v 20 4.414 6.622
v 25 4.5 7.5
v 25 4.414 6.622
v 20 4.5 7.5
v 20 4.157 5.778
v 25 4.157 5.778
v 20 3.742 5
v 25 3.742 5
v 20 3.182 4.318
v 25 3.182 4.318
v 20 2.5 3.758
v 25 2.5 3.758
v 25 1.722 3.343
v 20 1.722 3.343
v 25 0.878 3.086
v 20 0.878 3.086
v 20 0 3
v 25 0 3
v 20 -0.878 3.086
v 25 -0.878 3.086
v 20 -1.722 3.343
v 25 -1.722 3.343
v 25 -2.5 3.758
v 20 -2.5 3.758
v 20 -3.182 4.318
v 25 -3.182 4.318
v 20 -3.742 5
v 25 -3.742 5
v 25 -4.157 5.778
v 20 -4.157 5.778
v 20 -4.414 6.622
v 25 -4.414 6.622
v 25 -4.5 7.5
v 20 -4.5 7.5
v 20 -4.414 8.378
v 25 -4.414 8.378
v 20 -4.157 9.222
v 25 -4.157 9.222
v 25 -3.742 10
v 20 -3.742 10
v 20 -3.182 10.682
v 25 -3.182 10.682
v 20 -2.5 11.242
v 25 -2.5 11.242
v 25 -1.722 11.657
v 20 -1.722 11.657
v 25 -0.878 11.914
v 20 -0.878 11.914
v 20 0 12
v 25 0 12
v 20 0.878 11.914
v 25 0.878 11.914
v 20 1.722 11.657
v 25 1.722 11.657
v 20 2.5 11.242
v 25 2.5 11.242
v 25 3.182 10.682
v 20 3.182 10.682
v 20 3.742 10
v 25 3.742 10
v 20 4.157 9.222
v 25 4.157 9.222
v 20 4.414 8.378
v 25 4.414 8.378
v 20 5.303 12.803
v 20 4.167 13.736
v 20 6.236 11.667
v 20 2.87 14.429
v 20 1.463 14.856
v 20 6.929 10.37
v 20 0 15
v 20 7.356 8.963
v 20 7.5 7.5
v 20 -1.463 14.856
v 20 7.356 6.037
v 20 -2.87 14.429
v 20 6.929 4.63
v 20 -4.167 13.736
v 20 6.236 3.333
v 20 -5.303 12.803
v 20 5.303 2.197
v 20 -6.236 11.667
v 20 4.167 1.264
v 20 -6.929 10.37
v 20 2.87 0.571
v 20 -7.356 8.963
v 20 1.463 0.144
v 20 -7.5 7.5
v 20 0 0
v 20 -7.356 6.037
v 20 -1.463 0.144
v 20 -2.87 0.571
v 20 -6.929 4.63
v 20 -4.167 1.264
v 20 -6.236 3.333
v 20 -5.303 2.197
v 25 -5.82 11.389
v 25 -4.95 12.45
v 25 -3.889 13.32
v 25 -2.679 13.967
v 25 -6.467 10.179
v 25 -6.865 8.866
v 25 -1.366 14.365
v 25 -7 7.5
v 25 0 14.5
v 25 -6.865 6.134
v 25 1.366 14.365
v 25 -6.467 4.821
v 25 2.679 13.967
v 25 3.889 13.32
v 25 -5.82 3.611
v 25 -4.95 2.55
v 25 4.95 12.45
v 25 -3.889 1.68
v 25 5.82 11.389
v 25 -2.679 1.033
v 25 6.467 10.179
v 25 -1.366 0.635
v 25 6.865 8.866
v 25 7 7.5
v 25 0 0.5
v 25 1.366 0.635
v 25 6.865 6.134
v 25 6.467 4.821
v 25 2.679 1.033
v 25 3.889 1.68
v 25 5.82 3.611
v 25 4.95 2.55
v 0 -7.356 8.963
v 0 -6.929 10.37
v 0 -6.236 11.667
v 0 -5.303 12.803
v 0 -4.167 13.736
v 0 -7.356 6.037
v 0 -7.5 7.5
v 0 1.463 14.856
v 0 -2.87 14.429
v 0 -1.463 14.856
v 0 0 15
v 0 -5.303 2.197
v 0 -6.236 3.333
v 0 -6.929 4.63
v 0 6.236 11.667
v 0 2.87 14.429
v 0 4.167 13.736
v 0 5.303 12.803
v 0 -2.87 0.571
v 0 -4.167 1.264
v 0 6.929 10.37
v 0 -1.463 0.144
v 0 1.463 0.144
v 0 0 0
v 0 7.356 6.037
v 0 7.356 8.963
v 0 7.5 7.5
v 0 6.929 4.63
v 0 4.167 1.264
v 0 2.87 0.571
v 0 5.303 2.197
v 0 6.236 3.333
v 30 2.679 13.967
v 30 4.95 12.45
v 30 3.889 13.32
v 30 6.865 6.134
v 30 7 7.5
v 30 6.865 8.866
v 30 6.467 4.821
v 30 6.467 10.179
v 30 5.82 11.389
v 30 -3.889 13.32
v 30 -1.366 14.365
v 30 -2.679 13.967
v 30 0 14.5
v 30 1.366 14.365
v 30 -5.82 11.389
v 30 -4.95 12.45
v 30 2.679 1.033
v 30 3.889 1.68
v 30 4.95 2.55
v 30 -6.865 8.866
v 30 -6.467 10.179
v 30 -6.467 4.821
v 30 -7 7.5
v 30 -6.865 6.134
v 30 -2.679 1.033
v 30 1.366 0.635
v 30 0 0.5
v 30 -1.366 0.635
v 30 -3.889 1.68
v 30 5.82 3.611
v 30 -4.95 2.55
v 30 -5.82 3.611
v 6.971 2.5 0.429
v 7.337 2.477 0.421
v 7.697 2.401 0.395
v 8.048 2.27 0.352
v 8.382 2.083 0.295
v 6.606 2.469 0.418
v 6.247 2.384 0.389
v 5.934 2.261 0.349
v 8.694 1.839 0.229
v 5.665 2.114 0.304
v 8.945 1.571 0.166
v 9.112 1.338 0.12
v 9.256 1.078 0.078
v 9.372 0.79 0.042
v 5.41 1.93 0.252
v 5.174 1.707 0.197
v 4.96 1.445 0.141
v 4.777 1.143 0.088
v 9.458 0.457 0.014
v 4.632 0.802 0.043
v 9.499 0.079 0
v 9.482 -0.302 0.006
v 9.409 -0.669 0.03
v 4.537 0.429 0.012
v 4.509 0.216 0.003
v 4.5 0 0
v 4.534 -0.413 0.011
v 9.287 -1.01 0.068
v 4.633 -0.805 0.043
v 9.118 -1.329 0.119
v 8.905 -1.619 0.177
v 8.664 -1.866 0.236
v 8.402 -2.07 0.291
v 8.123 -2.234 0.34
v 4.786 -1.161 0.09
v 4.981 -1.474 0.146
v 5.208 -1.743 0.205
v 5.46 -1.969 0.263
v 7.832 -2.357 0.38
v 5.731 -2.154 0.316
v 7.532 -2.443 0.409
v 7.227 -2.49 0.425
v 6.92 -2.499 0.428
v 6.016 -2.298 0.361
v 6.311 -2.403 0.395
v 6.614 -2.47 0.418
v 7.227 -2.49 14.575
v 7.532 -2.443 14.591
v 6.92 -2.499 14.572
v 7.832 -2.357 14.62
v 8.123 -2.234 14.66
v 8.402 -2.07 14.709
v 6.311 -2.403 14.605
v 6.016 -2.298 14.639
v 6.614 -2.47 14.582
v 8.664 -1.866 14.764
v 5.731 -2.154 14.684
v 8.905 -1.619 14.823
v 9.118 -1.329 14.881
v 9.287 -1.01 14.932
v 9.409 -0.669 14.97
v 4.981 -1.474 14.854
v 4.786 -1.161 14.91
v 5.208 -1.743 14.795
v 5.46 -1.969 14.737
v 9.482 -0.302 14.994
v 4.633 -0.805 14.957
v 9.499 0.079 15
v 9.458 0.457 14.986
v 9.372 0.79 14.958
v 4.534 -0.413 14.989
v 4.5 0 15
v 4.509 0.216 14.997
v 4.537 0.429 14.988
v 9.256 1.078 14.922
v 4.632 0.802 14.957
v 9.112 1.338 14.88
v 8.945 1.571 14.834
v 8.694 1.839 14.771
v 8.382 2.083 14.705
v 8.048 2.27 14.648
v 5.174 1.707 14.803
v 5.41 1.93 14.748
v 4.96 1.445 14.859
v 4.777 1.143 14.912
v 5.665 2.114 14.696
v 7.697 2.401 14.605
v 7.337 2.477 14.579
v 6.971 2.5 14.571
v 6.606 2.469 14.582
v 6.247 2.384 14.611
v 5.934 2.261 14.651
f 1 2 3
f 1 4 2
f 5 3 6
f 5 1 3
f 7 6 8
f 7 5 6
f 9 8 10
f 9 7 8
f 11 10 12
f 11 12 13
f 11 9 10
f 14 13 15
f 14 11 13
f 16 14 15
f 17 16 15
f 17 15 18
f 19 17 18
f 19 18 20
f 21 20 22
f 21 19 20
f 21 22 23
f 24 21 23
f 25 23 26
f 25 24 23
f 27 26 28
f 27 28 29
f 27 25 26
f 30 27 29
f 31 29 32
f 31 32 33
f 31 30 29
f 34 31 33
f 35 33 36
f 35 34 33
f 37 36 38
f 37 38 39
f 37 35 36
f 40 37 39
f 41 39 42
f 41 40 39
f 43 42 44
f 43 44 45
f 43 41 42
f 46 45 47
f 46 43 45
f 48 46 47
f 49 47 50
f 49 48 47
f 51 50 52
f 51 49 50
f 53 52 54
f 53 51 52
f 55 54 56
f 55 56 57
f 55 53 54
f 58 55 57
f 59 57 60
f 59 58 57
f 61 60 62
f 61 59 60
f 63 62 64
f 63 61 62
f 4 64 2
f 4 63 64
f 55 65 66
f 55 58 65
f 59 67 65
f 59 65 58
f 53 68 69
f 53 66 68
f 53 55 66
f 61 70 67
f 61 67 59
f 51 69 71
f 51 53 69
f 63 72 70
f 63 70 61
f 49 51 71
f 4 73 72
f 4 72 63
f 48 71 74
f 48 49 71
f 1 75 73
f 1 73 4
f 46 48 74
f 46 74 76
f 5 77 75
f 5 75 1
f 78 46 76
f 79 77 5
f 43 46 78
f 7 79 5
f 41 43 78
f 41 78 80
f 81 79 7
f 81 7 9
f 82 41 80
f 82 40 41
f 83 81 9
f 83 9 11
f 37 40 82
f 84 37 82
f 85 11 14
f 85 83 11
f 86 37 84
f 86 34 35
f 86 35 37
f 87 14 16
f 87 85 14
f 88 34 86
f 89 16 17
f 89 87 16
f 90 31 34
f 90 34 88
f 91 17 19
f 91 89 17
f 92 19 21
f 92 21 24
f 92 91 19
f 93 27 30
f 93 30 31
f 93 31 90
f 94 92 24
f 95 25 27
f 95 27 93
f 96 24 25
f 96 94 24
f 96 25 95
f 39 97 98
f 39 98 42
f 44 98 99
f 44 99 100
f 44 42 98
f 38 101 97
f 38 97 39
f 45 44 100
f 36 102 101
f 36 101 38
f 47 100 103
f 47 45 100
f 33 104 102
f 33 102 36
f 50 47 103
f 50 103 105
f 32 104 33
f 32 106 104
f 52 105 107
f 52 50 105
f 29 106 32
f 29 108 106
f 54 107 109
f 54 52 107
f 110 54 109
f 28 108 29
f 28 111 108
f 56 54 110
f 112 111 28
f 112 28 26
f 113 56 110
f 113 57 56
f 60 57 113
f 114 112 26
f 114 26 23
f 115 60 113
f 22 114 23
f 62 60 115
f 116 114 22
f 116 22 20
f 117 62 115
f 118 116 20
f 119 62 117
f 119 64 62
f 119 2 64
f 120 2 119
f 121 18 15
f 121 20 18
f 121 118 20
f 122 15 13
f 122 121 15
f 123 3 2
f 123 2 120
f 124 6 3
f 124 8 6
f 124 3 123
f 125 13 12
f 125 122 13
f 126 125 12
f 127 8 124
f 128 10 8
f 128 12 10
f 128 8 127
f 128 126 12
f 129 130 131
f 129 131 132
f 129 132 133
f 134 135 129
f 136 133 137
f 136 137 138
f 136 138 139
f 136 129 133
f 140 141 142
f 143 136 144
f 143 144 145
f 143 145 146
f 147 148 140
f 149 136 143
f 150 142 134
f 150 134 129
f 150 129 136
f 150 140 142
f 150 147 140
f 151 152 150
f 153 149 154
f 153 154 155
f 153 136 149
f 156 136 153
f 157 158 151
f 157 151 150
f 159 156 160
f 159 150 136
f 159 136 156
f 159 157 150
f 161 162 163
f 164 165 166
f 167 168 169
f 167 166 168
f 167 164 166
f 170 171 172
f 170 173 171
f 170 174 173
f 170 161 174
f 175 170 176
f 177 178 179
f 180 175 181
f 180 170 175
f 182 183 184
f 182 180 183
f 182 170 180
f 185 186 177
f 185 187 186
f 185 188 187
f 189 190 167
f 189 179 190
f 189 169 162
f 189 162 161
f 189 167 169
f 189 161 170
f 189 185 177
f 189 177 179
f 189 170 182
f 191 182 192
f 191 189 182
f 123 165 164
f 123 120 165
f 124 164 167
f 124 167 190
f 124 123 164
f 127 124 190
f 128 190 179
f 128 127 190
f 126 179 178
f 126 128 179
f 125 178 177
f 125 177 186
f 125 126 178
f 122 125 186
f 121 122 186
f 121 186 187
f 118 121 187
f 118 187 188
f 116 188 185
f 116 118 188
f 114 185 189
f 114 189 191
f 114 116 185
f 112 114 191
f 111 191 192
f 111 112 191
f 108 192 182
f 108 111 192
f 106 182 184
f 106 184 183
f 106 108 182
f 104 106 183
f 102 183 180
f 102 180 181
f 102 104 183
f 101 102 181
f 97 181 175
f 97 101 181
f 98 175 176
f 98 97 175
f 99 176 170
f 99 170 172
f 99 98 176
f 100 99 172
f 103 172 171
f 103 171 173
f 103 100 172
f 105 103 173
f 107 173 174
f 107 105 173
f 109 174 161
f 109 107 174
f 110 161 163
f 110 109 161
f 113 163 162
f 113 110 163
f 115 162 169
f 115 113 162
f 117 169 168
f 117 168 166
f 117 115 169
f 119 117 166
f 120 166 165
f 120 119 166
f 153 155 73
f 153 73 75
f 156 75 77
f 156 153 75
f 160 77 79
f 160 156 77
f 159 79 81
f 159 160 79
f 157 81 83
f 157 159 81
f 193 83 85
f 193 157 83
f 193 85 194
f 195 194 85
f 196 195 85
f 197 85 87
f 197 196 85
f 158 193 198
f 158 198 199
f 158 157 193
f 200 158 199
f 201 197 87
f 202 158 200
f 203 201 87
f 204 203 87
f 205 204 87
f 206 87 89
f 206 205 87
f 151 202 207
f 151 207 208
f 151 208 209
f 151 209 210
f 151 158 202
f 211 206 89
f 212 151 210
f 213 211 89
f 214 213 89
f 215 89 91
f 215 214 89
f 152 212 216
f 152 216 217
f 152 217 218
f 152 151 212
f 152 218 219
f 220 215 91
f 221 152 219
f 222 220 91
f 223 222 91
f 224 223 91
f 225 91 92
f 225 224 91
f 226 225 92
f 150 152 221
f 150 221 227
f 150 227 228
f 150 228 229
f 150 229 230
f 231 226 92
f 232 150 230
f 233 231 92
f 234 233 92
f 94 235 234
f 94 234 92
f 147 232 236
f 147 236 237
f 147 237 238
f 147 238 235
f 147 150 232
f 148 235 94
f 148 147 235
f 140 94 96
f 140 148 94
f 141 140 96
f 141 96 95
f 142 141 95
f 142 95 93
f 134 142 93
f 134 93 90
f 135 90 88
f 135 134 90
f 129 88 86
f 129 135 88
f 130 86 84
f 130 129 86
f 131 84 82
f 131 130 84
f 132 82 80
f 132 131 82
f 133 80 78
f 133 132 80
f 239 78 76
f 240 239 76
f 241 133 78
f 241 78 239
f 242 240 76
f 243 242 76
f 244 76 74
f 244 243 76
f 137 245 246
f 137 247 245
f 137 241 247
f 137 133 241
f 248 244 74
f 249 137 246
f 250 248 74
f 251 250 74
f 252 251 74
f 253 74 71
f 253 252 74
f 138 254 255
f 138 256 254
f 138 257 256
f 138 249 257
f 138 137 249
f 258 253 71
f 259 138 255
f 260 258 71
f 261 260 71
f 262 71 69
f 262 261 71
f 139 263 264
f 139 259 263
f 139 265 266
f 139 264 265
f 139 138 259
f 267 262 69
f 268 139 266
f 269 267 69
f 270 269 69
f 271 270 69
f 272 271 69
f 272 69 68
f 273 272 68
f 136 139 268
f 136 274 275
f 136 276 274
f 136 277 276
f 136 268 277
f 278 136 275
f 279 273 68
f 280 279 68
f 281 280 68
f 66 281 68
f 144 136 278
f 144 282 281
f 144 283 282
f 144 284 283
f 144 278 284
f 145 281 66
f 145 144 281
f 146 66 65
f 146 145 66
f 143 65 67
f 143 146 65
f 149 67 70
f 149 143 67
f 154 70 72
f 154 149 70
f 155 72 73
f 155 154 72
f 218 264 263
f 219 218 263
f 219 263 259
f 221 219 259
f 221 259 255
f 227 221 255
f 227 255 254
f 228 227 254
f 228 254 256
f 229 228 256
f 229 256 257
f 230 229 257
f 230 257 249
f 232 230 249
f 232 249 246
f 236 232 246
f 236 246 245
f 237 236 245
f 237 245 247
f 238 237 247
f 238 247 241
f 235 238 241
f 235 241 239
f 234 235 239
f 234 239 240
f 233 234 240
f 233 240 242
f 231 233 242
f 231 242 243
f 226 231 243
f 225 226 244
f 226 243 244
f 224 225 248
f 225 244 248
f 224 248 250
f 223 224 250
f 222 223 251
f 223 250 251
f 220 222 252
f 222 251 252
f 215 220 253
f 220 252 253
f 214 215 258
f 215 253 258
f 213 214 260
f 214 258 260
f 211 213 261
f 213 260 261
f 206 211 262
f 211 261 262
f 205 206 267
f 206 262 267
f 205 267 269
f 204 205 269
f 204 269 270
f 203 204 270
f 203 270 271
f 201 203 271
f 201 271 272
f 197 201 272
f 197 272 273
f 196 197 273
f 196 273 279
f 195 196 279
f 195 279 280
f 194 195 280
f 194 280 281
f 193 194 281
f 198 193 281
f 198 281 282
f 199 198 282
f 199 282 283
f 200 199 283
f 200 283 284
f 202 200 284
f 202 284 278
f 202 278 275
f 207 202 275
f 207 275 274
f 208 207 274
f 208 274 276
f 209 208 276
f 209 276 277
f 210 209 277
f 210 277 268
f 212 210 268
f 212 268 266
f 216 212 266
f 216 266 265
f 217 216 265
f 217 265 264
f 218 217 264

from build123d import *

# Parameters (mm, degrees)
F4_D = 5


with BuildPart() as f1:
    # F0 (on Top) → F1 (revolve)
    with BuildSketch(Plane.XY):
        Polygon((0, 7.5), (0, 0), (30, 0), (30, 7), (25, 7), (25, 4.5), (20, 4.5), (20, 7.5), align=None)
    revolve(axis=Axis((15, 0, 0), (-1, 0, 0)))


with BuildPart() as f1_1:
    # F2: moved
    add(f1.part.moved(Location((0, 0, 7.5))))

    # F4 (through all)
    with Locations(Plane(origin=(0, 0, 0), x_dir=(1, 0, 0), z_dir=(0, 0, -1))):
        with Locations((7, 0)):
            Hole(F4_D / 2)


solid = f1_1.part
